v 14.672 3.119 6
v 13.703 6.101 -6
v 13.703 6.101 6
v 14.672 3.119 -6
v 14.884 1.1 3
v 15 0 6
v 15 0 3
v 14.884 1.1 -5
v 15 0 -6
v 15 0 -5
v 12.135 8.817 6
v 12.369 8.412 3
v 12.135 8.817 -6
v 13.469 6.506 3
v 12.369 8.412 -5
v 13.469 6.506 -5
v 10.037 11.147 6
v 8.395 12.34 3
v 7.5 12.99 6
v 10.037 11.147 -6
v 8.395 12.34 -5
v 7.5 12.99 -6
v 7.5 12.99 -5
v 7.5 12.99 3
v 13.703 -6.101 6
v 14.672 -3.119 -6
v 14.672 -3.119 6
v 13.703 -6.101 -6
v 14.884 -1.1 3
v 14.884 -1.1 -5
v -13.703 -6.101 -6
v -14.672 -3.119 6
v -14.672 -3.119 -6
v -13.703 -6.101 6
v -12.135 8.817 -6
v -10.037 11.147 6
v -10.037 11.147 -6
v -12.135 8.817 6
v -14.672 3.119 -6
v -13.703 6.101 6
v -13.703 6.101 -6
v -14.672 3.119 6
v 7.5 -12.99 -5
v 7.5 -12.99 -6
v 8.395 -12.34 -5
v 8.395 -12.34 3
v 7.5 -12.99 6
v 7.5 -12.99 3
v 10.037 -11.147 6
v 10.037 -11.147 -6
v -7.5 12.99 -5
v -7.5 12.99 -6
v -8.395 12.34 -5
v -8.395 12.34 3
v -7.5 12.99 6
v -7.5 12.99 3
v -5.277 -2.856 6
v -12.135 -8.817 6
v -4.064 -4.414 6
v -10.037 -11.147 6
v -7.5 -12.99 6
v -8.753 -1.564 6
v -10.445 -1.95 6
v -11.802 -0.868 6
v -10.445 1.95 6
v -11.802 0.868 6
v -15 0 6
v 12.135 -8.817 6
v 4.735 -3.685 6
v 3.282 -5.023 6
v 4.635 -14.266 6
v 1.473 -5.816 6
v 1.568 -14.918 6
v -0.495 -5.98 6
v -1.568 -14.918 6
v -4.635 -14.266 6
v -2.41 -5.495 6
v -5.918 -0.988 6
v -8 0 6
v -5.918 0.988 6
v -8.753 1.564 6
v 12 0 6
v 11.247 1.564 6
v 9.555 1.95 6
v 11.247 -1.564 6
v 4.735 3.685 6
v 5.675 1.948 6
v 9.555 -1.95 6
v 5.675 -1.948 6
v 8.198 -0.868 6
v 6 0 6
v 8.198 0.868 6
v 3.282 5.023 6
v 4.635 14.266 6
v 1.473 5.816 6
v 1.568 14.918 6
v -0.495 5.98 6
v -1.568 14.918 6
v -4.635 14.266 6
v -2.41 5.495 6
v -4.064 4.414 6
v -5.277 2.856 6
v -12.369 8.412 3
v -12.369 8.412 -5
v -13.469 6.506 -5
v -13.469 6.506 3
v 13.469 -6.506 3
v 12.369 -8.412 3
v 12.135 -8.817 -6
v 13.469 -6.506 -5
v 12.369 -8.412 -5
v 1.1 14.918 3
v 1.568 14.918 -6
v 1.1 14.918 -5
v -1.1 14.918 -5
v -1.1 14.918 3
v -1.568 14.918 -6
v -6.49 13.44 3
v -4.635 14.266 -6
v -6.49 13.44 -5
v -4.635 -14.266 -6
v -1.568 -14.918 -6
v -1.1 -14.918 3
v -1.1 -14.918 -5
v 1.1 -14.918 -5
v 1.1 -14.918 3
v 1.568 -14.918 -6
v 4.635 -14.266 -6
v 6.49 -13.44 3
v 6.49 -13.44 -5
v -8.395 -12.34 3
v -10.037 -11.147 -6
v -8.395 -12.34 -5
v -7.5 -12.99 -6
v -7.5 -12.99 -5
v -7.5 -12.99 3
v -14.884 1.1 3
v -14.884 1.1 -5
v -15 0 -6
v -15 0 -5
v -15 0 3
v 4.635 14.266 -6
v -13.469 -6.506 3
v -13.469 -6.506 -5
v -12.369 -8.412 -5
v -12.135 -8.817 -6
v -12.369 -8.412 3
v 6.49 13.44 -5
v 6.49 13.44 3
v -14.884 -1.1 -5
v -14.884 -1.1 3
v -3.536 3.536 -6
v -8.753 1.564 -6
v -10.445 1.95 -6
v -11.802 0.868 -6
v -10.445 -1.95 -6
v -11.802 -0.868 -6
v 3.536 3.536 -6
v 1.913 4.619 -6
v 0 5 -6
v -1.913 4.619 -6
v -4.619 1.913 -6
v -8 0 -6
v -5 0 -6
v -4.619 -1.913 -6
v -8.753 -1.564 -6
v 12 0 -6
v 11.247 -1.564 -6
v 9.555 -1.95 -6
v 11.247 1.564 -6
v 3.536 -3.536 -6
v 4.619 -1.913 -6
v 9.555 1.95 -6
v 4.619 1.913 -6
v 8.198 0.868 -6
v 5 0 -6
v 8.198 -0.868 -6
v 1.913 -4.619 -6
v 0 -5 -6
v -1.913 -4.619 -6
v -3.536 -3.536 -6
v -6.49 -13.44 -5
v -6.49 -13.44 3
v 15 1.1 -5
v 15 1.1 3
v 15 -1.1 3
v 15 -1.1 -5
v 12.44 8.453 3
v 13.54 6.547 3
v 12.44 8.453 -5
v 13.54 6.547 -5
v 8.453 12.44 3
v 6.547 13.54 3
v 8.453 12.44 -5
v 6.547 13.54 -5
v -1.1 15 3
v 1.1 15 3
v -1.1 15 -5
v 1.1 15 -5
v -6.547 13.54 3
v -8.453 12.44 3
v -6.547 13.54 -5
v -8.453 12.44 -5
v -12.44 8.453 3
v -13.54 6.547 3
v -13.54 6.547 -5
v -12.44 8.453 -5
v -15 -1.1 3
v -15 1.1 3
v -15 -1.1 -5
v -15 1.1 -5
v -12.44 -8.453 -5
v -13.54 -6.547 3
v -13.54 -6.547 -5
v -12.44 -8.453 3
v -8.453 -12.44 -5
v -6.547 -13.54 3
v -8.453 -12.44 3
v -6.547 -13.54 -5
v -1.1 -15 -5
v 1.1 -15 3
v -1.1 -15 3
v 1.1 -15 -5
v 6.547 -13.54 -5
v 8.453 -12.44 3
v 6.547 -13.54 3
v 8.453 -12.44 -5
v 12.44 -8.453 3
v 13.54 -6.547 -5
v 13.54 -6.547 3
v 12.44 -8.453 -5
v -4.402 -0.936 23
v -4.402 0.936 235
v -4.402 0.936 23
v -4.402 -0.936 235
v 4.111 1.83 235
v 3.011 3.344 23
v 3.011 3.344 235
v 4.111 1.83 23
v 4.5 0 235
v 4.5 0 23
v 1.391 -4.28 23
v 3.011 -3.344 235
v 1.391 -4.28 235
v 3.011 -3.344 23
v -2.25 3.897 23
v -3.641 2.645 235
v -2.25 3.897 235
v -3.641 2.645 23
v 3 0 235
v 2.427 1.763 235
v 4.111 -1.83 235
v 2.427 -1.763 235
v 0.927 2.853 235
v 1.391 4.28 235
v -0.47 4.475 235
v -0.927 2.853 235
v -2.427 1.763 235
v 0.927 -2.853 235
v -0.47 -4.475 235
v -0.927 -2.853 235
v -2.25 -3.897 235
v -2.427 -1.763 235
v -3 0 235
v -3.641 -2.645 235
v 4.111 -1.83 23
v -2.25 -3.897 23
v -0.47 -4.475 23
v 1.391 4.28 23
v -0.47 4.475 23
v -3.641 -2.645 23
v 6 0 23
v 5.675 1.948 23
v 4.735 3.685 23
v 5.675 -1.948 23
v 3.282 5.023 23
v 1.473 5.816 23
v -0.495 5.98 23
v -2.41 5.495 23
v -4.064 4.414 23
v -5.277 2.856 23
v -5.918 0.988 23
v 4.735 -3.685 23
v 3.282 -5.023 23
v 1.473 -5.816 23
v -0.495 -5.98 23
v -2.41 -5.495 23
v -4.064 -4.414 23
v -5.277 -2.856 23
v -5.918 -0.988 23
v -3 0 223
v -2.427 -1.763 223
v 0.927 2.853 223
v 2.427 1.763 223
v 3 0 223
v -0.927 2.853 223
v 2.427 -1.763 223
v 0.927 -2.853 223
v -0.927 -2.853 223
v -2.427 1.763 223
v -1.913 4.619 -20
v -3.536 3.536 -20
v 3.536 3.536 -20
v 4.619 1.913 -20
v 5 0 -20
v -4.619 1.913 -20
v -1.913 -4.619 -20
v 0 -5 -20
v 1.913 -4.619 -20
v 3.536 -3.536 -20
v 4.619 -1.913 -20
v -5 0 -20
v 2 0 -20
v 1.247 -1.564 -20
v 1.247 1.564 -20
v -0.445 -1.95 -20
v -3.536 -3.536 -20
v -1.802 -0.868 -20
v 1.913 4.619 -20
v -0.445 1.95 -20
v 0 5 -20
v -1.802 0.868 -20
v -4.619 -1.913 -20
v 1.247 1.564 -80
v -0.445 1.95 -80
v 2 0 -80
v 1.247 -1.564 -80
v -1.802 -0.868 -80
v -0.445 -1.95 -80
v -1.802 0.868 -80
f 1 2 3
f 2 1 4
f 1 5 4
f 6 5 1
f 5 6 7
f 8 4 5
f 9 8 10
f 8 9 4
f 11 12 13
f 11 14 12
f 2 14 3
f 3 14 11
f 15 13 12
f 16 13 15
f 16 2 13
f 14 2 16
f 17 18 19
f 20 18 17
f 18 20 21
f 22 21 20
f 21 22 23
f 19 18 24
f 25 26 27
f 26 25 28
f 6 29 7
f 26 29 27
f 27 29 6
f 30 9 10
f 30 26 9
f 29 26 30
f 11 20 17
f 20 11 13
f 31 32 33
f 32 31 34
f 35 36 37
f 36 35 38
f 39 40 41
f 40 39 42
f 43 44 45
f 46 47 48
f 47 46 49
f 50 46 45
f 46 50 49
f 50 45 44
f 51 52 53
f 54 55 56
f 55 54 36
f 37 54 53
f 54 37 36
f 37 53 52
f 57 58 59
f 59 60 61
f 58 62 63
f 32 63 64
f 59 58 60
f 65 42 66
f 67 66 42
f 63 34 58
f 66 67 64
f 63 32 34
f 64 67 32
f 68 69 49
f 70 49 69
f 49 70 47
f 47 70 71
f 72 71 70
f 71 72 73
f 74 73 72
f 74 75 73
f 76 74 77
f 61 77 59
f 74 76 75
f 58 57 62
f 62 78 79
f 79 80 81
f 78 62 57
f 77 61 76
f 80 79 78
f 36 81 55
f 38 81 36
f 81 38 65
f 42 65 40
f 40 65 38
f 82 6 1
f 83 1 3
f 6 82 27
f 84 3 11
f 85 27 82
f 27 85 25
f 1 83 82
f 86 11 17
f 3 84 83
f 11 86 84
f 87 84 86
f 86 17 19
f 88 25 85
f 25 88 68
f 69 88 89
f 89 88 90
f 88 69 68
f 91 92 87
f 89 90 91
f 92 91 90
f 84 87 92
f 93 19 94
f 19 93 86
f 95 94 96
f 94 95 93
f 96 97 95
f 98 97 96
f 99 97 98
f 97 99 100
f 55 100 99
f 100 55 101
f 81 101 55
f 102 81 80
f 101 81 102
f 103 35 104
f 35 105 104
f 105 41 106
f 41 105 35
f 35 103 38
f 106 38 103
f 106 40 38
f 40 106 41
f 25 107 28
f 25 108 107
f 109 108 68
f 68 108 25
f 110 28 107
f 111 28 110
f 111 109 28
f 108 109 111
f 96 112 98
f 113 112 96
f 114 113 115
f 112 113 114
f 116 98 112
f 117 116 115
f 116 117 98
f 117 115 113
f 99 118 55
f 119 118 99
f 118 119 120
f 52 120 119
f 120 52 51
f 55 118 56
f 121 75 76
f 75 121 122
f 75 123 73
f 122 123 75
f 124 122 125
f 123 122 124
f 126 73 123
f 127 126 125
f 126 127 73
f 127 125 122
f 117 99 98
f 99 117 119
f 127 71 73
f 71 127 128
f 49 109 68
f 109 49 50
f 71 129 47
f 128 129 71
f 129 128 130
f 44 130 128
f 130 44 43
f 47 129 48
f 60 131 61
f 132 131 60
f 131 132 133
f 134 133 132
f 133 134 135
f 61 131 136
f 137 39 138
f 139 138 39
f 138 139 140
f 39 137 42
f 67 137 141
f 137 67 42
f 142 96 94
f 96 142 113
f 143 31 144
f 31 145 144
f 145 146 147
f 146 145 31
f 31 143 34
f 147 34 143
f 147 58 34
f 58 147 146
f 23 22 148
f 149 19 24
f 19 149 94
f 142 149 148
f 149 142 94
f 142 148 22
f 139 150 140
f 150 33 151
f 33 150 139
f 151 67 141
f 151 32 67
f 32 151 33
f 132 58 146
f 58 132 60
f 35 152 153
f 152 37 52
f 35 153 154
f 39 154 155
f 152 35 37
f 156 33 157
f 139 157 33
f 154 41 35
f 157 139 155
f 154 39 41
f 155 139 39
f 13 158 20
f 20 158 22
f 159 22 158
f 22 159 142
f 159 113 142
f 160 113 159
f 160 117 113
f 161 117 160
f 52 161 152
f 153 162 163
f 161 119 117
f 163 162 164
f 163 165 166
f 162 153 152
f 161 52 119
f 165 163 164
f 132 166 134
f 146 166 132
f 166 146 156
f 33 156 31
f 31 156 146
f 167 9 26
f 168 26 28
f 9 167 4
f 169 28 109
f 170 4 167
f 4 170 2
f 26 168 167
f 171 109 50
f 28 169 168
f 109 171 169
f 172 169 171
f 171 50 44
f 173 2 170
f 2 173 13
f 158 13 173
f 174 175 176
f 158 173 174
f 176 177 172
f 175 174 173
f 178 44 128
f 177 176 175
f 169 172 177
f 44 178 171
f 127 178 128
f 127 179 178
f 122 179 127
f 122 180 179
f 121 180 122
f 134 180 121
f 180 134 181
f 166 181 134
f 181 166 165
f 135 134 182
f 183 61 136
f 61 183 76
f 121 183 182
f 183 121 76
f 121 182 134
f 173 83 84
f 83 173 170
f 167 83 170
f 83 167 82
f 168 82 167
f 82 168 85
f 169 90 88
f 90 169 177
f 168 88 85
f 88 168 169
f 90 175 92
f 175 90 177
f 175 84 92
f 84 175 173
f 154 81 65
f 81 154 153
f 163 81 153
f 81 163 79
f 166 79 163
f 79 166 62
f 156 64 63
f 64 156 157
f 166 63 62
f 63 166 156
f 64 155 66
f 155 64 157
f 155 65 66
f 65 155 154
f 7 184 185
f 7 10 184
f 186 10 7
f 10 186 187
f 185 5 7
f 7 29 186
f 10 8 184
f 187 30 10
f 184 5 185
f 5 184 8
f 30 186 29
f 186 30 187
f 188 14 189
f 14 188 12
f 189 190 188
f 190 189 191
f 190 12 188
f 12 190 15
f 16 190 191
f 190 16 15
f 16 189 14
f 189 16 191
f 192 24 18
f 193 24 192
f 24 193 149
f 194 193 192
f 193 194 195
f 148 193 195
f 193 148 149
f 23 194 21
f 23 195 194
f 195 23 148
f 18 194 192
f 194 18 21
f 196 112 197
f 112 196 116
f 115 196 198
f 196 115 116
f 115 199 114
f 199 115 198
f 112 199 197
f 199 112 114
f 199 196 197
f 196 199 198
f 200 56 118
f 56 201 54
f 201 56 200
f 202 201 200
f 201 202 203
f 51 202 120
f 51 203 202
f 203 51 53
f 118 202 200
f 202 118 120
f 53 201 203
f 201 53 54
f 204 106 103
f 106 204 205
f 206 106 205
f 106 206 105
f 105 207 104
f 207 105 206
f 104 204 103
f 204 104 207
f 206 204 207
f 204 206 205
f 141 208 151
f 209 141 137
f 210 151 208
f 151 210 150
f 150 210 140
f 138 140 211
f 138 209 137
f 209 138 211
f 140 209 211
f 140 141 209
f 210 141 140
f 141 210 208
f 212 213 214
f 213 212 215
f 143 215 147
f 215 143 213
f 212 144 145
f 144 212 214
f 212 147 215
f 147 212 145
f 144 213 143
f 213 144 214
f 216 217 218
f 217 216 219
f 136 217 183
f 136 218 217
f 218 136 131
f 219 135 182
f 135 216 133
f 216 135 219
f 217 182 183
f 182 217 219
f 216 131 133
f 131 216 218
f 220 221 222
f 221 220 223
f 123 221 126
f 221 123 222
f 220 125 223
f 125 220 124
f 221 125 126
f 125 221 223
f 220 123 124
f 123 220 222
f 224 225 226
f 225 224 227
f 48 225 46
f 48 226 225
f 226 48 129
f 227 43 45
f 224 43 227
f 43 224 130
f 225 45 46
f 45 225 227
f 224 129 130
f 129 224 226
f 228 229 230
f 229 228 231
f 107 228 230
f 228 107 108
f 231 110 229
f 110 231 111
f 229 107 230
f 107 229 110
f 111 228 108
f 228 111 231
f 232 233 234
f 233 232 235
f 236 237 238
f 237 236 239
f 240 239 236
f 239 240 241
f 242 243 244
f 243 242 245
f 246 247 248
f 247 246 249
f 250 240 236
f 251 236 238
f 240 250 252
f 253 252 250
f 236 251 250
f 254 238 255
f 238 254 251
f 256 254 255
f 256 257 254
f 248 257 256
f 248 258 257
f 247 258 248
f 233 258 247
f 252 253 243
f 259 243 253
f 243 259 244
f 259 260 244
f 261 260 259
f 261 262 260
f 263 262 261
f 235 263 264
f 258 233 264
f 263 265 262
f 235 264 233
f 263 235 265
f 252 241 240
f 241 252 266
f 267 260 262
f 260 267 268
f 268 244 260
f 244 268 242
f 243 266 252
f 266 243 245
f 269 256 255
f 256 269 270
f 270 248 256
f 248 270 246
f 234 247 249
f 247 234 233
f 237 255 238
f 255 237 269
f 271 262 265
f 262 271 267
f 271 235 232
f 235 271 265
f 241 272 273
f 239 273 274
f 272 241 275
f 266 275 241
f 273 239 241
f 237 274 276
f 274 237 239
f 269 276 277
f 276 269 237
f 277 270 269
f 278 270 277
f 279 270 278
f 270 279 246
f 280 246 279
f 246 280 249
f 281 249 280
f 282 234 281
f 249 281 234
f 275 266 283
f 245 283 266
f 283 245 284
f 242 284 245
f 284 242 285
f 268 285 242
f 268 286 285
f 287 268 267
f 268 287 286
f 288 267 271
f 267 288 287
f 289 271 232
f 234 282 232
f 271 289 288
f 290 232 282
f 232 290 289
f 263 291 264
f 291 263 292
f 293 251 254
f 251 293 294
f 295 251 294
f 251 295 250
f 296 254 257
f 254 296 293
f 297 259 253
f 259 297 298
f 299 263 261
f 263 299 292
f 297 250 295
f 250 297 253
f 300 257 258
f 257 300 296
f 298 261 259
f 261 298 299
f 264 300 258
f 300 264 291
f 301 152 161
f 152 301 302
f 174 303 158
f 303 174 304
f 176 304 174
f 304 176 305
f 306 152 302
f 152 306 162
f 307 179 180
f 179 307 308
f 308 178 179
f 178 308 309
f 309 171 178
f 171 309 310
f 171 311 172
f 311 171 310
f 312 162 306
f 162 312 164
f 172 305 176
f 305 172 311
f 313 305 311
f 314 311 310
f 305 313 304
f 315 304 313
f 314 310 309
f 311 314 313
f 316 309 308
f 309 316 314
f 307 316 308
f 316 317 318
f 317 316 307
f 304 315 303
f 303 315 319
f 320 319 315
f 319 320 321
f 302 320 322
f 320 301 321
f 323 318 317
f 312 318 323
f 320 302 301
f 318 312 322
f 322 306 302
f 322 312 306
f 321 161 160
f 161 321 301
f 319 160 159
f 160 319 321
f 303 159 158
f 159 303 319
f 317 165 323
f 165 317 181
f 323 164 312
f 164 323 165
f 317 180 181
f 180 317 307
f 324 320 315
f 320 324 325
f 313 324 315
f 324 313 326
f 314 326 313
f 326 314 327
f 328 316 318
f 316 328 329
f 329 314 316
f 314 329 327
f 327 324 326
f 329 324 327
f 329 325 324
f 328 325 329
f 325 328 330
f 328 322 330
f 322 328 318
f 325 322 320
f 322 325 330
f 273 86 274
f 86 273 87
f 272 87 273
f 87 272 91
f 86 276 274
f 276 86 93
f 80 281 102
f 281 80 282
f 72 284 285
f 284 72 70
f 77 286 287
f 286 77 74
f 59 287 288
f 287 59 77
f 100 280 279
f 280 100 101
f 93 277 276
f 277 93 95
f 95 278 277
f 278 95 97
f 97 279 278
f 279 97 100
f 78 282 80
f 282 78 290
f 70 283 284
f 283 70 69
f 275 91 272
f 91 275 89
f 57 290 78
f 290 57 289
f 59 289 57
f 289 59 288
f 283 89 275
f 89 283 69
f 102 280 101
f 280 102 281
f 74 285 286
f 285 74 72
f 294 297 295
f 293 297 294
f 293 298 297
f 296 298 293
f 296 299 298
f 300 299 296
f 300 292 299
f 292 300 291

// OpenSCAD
// Parameters
antenna_height = 200; //[100:400:1]
antenna_diameter = 6; //[3:12:0.5]
base_diameter = 30; //[15:60:1]
base_height = 12; //[6:24:1]
connector_diameter = 10; //[5:20:0.5]
connector_length = 15; //[8:30:1]
mount_hole_diameter = 4; //[2:8:0.5]
mount_hole_count = 2; //[1:6:1]
mount_hole_spacing = 20; //[10:40:1]
overlap = 1; //[0.5:2:0.1]
radome_thickness = 1.5; //[0.8:3:0.1]
radome_extra_radius = 1.5; //[0.5:4:0.1]
radome_cap_height = 12; //[6:24:1]
spring_height = 18; //[10:40:1]
spring_diameter = 12; //[8:20:0.5]
cable_diameter = 4; //[2:8:0.5]
cable_length = 60; //[30:150:1]
rib_count = 12; //[6:24:1]
rib_depth = 1.2; //[0.5:3:0.1]
rib_width = 2.2; //[1:5:0.1]
rib_height = 8; //[4:16:1]

// Base Mount with Holes
module base_mount_with_holes() {
  difference() {
    cylinder(r=base_diameter/2, h=base_height, center=true);
    translate([mount_hole_spacing/2, 0, 0])
      cylinder(r=mount_hole_diameter/2, h=base_height + 2*overlap, center=true);
    translate([-mount_hole_spacing/2, 0, 0])
      cylinder(r=mount_hole_diameter/2, h=base_height + 2*overlap, center=true);
  }
}

// Ribs
module rib_proto() {
  translate([base_diameter/2 - (rib_depth + overlap)/2, 0, -base_height/2 + rib_height/2 + overlap])
    cube([rib_depth + overlap, rib_width, rib_height], center=true);
}

module knurling_or_ribs() {
  union() {
    for (i = [0:rib_count-1]) {
      rotate([0, 0, i*360/rib_count])
        rib_proto();
    }
  }
}

// Base Mount with Ribs
module base_mount_with_ribs() {
  union() {
    base_mount_with_holes();
    knurling_or_ribs();
  }
}

// Connector Stub
module connector_stub() {
  translate([0, 0, -base_height/2 - connector_length/2 + overlap])
    cylinder(r=connector_diameter/2, h=connector_length, center=true);
}

// Cable
module cable() {
  translate([0, 0, -base_height/2 - connector_length - cable_length/2 + overlap])
    cylinder(r=cable_diameter/2, h=cable_length, center=true);
}

// Spring Flex Section
module spring_flex_section() {
  translate([0, 0, base_height/2 + spring_height/2 - overlap])
    cylinder(r=spring_diameter/2, h=spring_height, center=true);
}

// Radiating Element
module radiating_element() {
  translate([0, 0, base_height/2 + spring_height - overlap + antenna_height/2])
    cylinder(r=antenna_diameter/2, h=antenna_height, center=true);
}

// Radome Cover
module radome_cover() {
  difference() {
    translate([0, 0, base_height/2 + spring_height - overlap + (antenna_height + radome_cap_height)/2])
      cylinder(r=antenna_diameter/2 + radome_extra_radius, h=antenna_height + radome_cap_height, center=true);
    translate([0, 0, base_height/2 + spring_height - overlap + (antenna_height + radome_cap_height)/2 + radome_thickness])
      cylinder(r=antenna_diameter/2 + radome_extra_radius - radome_thickness, h=antenna_height + radome_cap_height, center=true);
  }
}

// Branding Text Placeholder
module branding_text_placeholder() {
  translate([0, 0, -base_height/2 + radome_thickness/2])
    cube([base_diameter/4, base_diameter/10, radome_thickness], center=true);
}

// Antenna Assembly
module antenna_assembly_union() {
  union() {
    base_mount_with_ribs();
    connector_stub();
    cable();
    spring_flex_section();
    radiating_element();
    radome_cover();
    branding_text_placeholder();
  }
}

// Final Output
antenna_assembly_union();
